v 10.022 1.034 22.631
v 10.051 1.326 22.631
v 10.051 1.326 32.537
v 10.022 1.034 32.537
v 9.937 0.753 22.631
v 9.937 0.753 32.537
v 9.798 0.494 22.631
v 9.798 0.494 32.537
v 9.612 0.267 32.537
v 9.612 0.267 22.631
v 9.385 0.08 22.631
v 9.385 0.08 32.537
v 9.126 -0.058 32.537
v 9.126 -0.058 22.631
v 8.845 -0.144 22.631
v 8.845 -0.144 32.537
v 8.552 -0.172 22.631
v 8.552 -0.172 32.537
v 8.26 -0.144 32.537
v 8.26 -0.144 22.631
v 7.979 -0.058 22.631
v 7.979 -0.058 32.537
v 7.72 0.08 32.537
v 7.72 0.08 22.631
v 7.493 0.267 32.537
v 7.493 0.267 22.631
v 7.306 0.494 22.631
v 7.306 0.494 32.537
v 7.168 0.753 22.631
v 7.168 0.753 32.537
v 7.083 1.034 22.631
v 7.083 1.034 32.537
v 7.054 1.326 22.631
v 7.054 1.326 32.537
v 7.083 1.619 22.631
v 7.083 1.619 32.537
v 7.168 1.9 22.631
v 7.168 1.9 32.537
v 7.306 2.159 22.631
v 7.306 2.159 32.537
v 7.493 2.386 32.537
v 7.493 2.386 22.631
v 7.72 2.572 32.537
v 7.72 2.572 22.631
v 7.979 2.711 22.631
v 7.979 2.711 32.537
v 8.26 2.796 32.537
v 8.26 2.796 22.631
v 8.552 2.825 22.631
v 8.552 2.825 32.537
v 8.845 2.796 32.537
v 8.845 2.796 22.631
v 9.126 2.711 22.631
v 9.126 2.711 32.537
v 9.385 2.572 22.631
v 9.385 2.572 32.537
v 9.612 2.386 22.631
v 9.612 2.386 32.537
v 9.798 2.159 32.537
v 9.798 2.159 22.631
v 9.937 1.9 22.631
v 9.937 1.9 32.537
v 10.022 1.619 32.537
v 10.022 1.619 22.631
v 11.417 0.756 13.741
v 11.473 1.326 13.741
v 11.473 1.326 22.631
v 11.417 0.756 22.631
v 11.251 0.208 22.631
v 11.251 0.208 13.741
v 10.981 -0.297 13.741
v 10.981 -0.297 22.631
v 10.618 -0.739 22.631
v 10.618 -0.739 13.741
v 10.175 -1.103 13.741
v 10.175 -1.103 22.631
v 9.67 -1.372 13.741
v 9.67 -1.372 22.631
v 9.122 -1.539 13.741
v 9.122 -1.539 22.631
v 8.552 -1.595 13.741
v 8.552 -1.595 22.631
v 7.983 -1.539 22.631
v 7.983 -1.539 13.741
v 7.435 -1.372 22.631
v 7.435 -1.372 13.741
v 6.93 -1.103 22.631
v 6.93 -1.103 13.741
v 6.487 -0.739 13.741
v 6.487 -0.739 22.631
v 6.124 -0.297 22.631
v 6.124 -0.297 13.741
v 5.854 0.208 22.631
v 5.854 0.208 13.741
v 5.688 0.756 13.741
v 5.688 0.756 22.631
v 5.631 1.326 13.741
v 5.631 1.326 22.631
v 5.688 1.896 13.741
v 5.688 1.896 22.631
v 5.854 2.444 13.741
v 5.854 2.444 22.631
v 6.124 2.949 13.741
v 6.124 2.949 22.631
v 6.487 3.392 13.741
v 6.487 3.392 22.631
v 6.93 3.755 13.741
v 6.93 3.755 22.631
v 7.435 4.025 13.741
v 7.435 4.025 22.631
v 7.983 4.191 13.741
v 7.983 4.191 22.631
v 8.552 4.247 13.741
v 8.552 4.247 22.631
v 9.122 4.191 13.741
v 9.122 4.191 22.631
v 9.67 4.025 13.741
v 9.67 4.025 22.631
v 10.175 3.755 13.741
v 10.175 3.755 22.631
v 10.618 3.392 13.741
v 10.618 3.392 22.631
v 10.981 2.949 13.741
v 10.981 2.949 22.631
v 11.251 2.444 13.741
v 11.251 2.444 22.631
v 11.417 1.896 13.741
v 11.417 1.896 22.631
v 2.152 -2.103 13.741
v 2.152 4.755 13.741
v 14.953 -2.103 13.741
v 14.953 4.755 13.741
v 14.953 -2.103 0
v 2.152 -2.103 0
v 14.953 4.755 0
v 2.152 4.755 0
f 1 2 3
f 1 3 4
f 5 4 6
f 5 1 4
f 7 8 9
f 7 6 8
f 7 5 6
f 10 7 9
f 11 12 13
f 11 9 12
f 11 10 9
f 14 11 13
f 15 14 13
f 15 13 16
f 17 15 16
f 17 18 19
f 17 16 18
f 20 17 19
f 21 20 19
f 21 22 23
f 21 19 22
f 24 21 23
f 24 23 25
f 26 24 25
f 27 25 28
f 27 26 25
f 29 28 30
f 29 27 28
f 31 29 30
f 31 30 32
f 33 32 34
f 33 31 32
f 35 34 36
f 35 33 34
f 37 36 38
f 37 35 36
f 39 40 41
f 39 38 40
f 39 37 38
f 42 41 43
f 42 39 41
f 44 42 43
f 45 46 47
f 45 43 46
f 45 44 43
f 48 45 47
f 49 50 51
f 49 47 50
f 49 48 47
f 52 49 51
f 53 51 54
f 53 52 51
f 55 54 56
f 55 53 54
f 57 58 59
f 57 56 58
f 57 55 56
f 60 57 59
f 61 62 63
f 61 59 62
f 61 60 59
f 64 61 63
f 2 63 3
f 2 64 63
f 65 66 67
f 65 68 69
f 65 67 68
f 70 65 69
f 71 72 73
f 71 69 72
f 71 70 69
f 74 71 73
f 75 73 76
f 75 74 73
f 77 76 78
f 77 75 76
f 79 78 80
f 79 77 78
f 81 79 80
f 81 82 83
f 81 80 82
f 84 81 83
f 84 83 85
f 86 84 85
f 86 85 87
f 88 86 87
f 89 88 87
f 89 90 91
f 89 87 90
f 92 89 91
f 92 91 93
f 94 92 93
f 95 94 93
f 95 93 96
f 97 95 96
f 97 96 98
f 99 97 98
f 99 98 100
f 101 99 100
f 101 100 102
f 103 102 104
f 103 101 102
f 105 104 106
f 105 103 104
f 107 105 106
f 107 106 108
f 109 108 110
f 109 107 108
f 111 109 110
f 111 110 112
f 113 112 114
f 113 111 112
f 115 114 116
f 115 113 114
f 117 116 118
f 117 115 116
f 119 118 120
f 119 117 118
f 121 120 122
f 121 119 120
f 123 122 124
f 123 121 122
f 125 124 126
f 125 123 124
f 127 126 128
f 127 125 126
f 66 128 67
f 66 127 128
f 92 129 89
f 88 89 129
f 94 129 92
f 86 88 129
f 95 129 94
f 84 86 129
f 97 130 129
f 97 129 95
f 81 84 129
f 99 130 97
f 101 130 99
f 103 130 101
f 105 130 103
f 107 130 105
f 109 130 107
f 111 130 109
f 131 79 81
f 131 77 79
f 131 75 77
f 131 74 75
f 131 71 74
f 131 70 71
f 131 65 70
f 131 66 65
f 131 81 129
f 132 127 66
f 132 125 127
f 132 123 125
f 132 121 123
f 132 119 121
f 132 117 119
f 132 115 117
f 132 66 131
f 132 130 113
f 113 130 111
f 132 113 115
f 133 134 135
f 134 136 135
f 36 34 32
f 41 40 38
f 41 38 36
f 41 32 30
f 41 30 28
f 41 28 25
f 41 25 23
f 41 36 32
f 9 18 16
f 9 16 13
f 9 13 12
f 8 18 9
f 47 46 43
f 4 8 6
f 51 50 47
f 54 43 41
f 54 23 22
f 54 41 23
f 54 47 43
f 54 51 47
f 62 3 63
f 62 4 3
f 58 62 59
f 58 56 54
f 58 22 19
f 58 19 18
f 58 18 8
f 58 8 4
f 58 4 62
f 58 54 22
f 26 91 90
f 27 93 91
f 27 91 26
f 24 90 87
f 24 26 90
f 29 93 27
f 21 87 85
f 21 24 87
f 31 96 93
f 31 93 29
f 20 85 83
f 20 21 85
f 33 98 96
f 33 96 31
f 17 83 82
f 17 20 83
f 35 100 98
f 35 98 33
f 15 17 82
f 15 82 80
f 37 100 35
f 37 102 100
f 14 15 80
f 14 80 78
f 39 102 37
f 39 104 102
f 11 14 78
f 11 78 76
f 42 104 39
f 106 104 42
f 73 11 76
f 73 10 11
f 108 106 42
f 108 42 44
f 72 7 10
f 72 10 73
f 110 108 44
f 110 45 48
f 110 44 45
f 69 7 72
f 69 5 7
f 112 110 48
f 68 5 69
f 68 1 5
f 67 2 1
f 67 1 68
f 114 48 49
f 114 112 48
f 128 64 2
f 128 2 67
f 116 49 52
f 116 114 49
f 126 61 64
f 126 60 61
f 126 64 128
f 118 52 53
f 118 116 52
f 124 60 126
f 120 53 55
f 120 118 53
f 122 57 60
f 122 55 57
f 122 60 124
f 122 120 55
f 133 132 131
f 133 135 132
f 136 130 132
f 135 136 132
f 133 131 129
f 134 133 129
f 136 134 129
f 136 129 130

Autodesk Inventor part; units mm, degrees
ref_plane "YZ Plane" through (0, 0, 0) normal (1, 0, 0) x (0, 1, 0)
ref_plane "XZ Plane" through (0, 0, 0) normal (0, 1, 0) x (-1, 0, 0)
ref_plane "XY Plane" through (0, 0, 0) normal (0, 0, 1) x (1, 0, 0)
sketch "Sketch1" plane through (0, 0, 0) normal (0, 0, 1) x (1, 0, 0)
  line L0 (2.1516, 4.7552) -> (14.9532, 4.7552)
  line L1 (14.9532, 4.7552) -> (14.9532, -2.1028)
  line L2 (14.9532, -2.1028) -> (2.1516, -2.1028)
  line L3 (2.1516, -2.1028) -> (2.1516, 4.7552)
  point P0 (0, 0)
  dimension "d0" = 12.8016
  dimension "d1" = 6.858
extrude "Extrusion1" add sketch "Sketch1" along normal blind 13.7414
sketch "Sketch2" plane through (0, 0, 13.7414) normal (0, 0, 1) x (1, 0, 0)
  circle A0 centre (8.5524, 1.3262) radius 2.921
  line L0 (14.9532, -2.1028) -> (14.9532, 4.7552) projected
  line L1 (14.9532, 4.7552) -> (2.1516, 4.7552) projected
  point P0 (0, 0)
  dimension "d4" = 5.842
  dimension "d5" = 6.4008
  dimension "d6" = 3.429
extrude "Extrusion2" add sketch "Sketch2" along normal blind 8.89
sketch "Sketch3" plane through (8.5524, 1.3262, 22.6314) normal (0, 0, 1) x (1, 0, 0)
  circle A0 centre (0, 0) radius 1.4986
  point P0 (-8.5524, -1.3262)
  dimension "d9" = 2.9972
extrude "Extrusion3" add sketch "Sketch3" along normal blind 9.906
properties part number "Switch"
